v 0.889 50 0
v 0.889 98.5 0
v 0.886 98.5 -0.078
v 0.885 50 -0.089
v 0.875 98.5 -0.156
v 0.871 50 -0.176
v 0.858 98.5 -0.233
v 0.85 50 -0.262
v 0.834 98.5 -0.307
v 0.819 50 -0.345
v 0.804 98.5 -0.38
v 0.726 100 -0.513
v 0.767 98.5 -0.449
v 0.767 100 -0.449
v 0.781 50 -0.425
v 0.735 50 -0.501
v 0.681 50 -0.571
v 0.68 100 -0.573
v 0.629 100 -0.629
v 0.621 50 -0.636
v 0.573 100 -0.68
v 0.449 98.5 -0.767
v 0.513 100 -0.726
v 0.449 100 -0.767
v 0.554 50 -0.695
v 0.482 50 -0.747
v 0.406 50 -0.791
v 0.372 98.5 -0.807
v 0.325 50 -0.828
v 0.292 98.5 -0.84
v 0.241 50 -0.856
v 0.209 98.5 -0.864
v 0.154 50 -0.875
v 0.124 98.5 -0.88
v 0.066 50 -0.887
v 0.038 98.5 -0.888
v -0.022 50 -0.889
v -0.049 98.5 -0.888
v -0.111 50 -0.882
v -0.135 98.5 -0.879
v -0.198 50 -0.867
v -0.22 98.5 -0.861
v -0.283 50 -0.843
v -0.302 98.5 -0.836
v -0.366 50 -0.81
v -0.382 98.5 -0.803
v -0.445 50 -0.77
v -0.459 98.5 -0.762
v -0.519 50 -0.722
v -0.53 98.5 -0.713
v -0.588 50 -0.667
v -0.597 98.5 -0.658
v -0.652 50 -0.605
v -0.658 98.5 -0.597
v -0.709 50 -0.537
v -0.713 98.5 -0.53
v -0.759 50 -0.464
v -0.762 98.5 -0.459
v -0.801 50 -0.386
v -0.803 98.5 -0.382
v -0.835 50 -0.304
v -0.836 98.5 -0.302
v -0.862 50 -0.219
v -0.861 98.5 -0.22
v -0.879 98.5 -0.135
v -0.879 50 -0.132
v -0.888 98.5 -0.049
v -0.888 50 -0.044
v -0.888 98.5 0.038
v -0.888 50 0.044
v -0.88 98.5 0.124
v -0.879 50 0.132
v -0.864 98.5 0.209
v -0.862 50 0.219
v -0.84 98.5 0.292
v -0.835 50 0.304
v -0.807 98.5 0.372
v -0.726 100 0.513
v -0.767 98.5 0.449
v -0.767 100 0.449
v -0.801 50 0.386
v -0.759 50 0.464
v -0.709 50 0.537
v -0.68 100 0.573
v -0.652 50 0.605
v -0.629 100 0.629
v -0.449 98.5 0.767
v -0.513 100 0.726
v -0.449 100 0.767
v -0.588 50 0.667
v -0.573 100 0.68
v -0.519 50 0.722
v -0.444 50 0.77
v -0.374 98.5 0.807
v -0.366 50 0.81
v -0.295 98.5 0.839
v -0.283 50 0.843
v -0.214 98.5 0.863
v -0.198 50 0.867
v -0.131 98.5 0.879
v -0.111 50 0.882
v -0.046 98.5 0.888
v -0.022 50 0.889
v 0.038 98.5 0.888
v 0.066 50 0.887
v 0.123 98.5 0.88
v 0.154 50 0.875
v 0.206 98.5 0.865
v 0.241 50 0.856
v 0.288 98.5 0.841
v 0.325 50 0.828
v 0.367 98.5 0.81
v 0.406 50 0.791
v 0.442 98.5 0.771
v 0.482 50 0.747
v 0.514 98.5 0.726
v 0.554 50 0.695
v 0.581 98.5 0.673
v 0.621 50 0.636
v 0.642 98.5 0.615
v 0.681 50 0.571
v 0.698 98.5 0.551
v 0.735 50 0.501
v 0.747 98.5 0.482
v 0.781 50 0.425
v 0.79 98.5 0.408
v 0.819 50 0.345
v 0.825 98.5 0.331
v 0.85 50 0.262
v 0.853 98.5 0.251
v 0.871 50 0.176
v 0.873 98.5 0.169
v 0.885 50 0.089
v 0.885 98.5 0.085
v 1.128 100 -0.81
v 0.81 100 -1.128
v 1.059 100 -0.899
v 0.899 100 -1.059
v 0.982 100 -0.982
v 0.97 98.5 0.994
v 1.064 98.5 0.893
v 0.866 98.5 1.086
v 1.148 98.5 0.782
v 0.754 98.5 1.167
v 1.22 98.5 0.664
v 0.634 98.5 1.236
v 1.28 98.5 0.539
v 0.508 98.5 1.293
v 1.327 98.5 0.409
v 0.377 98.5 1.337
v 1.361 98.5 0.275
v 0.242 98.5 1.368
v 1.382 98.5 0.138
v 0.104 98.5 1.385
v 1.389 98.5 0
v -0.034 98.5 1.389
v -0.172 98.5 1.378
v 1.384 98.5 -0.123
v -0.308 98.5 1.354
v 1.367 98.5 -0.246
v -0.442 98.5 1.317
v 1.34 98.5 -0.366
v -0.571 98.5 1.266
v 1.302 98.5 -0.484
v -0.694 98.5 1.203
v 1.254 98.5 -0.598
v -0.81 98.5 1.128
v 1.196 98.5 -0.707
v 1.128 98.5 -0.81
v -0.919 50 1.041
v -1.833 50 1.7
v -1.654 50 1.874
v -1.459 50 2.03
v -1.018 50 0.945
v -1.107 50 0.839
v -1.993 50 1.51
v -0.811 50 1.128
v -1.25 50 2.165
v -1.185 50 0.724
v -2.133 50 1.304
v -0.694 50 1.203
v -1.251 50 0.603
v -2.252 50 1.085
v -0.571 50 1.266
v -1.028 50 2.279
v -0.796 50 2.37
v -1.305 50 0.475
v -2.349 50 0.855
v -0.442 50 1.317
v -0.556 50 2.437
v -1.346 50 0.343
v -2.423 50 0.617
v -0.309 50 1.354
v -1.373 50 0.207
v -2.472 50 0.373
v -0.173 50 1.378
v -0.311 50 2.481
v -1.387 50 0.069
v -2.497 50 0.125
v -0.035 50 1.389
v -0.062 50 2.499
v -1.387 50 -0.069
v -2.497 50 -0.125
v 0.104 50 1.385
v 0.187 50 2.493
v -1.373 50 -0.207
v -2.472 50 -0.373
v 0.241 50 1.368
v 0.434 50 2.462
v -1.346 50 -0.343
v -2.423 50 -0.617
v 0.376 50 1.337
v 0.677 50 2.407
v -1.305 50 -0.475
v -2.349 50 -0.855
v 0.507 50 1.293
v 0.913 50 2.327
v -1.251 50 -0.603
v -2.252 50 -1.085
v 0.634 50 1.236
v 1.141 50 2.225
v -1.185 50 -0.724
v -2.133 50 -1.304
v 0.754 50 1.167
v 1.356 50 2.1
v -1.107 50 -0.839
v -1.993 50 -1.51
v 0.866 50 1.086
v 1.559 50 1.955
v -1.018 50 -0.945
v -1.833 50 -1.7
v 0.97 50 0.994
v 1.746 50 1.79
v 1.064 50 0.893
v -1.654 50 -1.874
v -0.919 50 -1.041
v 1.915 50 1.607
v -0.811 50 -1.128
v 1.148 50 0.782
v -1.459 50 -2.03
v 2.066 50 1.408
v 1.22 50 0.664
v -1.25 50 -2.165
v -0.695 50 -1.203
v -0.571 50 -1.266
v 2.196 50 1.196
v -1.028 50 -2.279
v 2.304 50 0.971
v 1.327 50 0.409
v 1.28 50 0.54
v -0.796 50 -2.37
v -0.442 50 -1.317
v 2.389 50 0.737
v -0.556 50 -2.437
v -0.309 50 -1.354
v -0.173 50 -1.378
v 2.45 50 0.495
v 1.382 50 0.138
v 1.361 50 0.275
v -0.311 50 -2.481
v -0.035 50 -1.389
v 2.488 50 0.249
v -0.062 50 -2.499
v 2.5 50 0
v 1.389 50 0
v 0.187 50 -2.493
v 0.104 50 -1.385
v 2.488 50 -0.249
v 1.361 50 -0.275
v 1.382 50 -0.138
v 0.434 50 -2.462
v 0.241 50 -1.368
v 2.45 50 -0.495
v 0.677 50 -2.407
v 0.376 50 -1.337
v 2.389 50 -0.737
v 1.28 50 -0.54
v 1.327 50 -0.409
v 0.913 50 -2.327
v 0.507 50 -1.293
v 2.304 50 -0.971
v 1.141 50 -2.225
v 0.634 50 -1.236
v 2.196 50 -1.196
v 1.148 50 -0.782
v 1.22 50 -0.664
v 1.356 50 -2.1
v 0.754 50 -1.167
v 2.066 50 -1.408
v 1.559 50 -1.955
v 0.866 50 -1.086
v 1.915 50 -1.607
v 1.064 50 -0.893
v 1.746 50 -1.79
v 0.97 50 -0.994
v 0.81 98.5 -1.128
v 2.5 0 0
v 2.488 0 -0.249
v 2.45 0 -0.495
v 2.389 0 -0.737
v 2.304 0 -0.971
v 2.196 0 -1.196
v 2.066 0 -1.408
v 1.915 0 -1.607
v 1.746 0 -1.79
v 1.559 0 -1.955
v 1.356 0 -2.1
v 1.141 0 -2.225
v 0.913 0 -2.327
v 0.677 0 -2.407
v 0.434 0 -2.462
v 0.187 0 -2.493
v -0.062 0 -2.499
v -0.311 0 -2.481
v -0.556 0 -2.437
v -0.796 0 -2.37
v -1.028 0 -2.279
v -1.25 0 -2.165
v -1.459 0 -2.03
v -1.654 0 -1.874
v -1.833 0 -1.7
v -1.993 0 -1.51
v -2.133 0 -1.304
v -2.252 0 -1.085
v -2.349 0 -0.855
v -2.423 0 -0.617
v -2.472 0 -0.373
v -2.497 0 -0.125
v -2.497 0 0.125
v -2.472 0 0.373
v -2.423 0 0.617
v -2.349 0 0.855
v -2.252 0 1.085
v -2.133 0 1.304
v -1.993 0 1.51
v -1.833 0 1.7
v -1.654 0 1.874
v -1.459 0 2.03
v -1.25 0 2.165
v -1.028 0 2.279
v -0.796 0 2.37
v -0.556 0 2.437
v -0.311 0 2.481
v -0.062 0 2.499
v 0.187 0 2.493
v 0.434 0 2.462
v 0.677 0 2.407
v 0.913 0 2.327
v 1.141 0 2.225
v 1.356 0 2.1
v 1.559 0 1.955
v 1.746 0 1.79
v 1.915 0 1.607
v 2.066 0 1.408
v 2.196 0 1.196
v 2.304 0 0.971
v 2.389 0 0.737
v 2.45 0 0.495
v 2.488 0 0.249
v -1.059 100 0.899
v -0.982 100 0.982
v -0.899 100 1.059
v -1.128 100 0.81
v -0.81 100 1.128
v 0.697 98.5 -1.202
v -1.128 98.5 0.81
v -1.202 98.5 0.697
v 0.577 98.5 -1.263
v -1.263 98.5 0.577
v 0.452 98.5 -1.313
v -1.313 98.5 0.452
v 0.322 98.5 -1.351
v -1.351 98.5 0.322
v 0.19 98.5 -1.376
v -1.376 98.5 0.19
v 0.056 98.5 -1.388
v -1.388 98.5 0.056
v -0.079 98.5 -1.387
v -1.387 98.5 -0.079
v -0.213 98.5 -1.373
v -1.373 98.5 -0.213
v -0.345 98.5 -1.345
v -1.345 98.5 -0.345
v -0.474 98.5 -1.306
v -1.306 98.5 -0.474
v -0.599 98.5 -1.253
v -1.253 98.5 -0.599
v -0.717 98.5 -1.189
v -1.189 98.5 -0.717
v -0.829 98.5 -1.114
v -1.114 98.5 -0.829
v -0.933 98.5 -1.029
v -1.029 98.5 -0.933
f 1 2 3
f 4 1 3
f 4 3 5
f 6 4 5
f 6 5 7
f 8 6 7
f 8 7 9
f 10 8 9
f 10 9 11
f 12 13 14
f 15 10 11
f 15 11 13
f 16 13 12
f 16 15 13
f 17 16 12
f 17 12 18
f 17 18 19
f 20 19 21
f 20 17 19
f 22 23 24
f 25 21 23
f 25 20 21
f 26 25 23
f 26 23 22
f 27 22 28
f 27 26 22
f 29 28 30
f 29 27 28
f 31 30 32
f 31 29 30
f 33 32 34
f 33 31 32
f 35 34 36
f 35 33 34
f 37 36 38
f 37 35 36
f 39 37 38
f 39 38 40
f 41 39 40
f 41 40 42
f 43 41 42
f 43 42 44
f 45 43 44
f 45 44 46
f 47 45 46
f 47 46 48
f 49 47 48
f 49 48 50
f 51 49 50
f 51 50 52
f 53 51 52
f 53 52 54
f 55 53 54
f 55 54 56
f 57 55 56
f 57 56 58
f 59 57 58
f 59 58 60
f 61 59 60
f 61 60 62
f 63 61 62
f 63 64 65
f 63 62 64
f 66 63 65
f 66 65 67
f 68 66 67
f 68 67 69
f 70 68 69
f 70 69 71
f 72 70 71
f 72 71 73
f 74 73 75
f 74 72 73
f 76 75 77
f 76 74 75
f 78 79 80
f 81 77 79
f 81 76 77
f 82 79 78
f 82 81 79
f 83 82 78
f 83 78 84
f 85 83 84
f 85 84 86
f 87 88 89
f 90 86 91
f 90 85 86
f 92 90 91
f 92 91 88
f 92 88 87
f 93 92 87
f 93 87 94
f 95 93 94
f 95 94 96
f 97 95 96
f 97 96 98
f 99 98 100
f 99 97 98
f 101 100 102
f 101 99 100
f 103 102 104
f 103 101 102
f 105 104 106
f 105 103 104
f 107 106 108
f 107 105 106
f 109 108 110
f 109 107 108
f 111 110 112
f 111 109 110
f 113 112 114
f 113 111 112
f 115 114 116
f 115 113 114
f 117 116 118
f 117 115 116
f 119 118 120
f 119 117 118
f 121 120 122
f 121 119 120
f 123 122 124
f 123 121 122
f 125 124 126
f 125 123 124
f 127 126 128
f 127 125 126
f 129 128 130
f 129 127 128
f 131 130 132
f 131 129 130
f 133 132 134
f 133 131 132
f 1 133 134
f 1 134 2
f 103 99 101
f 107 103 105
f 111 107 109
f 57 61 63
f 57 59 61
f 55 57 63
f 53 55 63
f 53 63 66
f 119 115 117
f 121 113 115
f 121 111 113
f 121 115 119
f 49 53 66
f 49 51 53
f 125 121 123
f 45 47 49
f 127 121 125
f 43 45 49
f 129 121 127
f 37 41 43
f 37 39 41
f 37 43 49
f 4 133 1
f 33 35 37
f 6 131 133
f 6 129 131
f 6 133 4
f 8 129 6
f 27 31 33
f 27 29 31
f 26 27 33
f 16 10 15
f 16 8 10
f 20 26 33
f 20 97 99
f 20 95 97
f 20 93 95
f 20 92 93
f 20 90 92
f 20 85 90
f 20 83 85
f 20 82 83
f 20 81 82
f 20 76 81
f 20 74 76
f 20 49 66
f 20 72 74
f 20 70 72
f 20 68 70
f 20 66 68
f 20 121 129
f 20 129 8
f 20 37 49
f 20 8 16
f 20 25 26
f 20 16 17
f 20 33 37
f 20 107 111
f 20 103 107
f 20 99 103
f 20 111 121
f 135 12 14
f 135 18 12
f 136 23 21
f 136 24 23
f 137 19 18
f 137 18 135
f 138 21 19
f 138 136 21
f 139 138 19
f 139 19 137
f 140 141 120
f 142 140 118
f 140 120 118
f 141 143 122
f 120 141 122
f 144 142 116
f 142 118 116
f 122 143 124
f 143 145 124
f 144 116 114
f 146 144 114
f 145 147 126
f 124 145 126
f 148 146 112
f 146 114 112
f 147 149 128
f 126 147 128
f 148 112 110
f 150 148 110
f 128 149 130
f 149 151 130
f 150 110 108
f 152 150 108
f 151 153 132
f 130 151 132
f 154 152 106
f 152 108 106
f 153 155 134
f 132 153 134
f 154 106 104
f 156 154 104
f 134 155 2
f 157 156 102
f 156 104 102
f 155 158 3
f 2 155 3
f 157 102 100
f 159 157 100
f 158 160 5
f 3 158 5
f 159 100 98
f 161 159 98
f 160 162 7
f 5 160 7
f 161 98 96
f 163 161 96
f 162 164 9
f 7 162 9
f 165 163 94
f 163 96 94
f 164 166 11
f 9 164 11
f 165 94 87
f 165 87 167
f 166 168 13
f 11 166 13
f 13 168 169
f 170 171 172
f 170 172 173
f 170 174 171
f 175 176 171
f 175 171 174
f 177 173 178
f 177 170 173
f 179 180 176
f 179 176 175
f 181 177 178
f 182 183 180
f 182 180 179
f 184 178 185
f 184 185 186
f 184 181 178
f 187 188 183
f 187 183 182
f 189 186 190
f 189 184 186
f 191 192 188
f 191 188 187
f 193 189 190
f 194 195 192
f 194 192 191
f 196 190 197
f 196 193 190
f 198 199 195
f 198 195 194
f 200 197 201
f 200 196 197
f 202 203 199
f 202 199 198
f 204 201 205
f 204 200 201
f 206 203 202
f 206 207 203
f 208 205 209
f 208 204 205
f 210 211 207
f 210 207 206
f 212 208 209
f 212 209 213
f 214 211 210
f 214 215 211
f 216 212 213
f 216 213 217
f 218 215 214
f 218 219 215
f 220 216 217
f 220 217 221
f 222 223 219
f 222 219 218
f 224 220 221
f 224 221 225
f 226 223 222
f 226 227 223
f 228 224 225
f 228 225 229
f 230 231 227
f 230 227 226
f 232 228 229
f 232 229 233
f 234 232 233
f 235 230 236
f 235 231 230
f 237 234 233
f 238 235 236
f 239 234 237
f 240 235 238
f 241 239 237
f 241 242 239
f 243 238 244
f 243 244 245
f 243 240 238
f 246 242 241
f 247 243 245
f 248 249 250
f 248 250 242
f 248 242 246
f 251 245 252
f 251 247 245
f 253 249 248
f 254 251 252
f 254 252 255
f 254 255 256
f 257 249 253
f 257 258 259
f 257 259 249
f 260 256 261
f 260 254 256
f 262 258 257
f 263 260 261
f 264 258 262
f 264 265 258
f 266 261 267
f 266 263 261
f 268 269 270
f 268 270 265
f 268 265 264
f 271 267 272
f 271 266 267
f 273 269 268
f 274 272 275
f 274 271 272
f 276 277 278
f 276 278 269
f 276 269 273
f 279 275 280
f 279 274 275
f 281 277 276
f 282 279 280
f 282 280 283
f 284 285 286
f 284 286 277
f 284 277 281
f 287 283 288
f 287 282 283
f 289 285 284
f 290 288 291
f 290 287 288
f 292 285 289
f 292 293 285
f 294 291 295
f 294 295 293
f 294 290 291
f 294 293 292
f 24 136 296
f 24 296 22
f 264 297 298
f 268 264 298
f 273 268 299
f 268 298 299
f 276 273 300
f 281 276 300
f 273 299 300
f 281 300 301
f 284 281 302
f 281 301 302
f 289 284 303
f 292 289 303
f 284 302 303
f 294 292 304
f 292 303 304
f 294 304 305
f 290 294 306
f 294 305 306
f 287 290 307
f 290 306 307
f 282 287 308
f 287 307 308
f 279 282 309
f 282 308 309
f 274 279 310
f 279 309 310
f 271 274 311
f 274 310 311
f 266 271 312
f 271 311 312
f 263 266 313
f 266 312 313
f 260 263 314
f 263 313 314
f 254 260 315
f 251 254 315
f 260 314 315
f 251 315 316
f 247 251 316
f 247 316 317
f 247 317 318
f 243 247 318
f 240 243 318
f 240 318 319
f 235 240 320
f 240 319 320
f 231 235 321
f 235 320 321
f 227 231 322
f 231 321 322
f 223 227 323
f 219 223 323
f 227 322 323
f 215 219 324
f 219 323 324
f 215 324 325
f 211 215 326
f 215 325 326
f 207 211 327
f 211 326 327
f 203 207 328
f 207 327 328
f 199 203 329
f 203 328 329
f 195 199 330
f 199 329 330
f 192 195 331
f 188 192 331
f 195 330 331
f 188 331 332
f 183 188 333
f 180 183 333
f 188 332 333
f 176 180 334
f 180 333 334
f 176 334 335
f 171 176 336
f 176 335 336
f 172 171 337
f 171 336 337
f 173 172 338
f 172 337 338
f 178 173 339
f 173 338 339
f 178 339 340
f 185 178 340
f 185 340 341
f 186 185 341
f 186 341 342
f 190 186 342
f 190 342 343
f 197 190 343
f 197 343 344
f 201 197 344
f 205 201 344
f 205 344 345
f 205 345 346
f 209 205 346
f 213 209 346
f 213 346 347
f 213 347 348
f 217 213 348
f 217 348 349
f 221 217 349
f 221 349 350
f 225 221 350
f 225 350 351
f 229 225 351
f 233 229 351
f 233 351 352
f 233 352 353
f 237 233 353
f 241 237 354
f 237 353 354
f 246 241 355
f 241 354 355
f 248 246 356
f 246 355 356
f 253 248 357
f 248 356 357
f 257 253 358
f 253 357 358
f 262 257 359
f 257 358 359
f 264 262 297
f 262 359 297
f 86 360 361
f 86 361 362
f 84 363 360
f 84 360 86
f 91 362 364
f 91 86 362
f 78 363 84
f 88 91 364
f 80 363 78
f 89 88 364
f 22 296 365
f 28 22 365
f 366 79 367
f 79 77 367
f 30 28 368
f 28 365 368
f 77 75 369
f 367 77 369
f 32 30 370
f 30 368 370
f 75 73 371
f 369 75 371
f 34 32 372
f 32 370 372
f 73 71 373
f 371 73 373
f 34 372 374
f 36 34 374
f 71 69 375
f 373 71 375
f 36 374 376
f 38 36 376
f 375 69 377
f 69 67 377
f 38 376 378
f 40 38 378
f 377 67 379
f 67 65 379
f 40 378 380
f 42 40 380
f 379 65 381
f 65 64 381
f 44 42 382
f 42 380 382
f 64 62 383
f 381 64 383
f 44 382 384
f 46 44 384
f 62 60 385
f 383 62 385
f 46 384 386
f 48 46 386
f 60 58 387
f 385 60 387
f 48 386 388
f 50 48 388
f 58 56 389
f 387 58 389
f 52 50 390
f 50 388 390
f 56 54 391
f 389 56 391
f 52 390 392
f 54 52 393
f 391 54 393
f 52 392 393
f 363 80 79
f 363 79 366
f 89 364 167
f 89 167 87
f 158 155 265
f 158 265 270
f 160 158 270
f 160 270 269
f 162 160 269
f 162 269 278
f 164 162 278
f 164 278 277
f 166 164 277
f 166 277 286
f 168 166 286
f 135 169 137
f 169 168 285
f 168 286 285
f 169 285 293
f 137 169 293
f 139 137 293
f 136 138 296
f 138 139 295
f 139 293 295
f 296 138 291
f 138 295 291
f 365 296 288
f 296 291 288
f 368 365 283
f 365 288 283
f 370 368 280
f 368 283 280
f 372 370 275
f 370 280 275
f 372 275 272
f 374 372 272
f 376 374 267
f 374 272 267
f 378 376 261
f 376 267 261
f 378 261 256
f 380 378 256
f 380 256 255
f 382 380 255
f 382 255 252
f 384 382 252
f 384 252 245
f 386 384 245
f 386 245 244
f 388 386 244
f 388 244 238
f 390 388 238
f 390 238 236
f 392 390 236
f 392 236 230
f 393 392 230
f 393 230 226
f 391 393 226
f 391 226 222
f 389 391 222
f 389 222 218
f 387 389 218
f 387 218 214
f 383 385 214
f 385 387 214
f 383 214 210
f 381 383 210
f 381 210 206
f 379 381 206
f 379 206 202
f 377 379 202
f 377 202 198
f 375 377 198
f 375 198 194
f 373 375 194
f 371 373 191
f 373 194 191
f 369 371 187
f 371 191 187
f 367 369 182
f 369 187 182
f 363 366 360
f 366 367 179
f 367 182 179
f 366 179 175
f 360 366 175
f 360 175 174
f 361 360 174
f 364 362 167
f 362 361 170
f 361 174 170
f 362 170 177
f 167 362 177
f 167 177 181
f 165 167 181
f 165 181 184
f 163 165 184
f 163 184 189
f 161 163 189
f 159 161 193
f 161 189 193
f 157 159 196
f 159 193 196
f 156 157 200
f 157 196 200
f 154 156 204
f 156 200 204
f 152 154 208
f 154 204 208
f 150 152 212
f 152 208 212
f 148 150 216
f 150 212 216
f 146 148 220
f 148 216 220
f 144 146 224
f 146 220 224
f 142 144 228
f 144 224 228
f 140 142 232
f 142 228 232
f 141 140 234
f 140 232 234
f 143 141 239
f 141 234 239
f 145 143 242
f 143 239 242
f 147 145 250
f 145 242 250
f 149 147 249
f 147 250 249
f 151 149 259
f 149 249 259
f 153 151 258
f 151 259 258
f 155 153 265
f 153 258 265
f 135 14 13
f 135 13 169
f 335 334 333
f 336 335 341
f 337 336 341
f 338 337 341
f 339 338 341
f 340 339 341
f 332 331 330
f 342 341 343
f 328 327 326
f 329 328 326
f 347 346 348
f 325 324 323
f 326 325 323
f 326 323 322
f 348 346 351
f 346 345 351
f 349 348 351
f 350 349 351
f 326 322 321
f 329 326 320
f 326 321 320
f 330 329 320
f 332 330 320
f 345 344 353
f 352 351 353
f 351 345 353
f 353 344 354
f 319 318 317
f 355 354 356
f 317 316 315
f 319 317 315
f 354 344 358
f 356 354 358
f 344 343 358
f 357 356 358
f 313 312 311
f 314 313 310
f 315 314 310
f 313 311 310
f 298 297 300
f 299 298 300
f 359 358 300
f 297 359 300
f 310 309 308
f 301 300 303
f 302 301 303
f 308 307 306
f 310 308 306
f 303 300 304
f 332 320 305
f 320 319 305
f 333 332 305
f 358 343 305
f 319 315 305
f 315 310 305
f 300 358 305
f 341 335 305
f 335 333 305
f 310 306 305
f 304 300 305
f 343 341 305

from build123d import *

# Parameters (mm, degrees)
SKETCH1_R           = 1.389
SKETCH1_R_2         = 0.889
BOSS_EXTRUDE1_DEPTH = 100
SKETCH2_R           = 2.5
BOSS_EXTRUDE2_DEPTH = 50
CUT_EXTRUDE1_DEPTH  = 1.5


with BuildPart() as part:
    # Sketch1 → Boss-Extrude1 (new body)
    with BuildSketch(Plane(origin=(0, 0, 0), x_dir=(1, 0, 0), z_dir=(0, 1, 0))):
        Circle(SKETCH1_R)
        Circle(SKETCH1_R_2, mode=Mode.SUBTRACT)
    extrude(amount=BOSS_EXTRUDE1_DEPTH)

    # Sketch2 → Boss-Extrude2 (add)
    with BuildSketch(Plane(origin=(0, 0, 0), x_dir=(1, 0, 0), z_dir=(0, 1, 0))):
        Circle(SKETCH2_R)
    extrude(amount=BOSS_EXTRUDE2_DEPTH)

    # Sketch3 → Cut-Extrude1 (cut)
    with BuildSketch(Plane(origin=(0, 100, 0), x_dir=(1, 0, 0), z_dir=(0, 1, 0))):
        Polygon((-2.121320344, 0), (0, 2.121320344), (0.901561146, 1.219759198), (-1.219759198, -0.901561146), align=None)
        Polygon((2.121320344, 0), (0, -2.121320344), (-0.901561146, -1.219759198), (1.219759198, 0.901561146), align=None)
    extrude(amount=-CUT_EXTRUDE1_DEPTH, mode=Mode.SUBTRACT)


solid = part.part
